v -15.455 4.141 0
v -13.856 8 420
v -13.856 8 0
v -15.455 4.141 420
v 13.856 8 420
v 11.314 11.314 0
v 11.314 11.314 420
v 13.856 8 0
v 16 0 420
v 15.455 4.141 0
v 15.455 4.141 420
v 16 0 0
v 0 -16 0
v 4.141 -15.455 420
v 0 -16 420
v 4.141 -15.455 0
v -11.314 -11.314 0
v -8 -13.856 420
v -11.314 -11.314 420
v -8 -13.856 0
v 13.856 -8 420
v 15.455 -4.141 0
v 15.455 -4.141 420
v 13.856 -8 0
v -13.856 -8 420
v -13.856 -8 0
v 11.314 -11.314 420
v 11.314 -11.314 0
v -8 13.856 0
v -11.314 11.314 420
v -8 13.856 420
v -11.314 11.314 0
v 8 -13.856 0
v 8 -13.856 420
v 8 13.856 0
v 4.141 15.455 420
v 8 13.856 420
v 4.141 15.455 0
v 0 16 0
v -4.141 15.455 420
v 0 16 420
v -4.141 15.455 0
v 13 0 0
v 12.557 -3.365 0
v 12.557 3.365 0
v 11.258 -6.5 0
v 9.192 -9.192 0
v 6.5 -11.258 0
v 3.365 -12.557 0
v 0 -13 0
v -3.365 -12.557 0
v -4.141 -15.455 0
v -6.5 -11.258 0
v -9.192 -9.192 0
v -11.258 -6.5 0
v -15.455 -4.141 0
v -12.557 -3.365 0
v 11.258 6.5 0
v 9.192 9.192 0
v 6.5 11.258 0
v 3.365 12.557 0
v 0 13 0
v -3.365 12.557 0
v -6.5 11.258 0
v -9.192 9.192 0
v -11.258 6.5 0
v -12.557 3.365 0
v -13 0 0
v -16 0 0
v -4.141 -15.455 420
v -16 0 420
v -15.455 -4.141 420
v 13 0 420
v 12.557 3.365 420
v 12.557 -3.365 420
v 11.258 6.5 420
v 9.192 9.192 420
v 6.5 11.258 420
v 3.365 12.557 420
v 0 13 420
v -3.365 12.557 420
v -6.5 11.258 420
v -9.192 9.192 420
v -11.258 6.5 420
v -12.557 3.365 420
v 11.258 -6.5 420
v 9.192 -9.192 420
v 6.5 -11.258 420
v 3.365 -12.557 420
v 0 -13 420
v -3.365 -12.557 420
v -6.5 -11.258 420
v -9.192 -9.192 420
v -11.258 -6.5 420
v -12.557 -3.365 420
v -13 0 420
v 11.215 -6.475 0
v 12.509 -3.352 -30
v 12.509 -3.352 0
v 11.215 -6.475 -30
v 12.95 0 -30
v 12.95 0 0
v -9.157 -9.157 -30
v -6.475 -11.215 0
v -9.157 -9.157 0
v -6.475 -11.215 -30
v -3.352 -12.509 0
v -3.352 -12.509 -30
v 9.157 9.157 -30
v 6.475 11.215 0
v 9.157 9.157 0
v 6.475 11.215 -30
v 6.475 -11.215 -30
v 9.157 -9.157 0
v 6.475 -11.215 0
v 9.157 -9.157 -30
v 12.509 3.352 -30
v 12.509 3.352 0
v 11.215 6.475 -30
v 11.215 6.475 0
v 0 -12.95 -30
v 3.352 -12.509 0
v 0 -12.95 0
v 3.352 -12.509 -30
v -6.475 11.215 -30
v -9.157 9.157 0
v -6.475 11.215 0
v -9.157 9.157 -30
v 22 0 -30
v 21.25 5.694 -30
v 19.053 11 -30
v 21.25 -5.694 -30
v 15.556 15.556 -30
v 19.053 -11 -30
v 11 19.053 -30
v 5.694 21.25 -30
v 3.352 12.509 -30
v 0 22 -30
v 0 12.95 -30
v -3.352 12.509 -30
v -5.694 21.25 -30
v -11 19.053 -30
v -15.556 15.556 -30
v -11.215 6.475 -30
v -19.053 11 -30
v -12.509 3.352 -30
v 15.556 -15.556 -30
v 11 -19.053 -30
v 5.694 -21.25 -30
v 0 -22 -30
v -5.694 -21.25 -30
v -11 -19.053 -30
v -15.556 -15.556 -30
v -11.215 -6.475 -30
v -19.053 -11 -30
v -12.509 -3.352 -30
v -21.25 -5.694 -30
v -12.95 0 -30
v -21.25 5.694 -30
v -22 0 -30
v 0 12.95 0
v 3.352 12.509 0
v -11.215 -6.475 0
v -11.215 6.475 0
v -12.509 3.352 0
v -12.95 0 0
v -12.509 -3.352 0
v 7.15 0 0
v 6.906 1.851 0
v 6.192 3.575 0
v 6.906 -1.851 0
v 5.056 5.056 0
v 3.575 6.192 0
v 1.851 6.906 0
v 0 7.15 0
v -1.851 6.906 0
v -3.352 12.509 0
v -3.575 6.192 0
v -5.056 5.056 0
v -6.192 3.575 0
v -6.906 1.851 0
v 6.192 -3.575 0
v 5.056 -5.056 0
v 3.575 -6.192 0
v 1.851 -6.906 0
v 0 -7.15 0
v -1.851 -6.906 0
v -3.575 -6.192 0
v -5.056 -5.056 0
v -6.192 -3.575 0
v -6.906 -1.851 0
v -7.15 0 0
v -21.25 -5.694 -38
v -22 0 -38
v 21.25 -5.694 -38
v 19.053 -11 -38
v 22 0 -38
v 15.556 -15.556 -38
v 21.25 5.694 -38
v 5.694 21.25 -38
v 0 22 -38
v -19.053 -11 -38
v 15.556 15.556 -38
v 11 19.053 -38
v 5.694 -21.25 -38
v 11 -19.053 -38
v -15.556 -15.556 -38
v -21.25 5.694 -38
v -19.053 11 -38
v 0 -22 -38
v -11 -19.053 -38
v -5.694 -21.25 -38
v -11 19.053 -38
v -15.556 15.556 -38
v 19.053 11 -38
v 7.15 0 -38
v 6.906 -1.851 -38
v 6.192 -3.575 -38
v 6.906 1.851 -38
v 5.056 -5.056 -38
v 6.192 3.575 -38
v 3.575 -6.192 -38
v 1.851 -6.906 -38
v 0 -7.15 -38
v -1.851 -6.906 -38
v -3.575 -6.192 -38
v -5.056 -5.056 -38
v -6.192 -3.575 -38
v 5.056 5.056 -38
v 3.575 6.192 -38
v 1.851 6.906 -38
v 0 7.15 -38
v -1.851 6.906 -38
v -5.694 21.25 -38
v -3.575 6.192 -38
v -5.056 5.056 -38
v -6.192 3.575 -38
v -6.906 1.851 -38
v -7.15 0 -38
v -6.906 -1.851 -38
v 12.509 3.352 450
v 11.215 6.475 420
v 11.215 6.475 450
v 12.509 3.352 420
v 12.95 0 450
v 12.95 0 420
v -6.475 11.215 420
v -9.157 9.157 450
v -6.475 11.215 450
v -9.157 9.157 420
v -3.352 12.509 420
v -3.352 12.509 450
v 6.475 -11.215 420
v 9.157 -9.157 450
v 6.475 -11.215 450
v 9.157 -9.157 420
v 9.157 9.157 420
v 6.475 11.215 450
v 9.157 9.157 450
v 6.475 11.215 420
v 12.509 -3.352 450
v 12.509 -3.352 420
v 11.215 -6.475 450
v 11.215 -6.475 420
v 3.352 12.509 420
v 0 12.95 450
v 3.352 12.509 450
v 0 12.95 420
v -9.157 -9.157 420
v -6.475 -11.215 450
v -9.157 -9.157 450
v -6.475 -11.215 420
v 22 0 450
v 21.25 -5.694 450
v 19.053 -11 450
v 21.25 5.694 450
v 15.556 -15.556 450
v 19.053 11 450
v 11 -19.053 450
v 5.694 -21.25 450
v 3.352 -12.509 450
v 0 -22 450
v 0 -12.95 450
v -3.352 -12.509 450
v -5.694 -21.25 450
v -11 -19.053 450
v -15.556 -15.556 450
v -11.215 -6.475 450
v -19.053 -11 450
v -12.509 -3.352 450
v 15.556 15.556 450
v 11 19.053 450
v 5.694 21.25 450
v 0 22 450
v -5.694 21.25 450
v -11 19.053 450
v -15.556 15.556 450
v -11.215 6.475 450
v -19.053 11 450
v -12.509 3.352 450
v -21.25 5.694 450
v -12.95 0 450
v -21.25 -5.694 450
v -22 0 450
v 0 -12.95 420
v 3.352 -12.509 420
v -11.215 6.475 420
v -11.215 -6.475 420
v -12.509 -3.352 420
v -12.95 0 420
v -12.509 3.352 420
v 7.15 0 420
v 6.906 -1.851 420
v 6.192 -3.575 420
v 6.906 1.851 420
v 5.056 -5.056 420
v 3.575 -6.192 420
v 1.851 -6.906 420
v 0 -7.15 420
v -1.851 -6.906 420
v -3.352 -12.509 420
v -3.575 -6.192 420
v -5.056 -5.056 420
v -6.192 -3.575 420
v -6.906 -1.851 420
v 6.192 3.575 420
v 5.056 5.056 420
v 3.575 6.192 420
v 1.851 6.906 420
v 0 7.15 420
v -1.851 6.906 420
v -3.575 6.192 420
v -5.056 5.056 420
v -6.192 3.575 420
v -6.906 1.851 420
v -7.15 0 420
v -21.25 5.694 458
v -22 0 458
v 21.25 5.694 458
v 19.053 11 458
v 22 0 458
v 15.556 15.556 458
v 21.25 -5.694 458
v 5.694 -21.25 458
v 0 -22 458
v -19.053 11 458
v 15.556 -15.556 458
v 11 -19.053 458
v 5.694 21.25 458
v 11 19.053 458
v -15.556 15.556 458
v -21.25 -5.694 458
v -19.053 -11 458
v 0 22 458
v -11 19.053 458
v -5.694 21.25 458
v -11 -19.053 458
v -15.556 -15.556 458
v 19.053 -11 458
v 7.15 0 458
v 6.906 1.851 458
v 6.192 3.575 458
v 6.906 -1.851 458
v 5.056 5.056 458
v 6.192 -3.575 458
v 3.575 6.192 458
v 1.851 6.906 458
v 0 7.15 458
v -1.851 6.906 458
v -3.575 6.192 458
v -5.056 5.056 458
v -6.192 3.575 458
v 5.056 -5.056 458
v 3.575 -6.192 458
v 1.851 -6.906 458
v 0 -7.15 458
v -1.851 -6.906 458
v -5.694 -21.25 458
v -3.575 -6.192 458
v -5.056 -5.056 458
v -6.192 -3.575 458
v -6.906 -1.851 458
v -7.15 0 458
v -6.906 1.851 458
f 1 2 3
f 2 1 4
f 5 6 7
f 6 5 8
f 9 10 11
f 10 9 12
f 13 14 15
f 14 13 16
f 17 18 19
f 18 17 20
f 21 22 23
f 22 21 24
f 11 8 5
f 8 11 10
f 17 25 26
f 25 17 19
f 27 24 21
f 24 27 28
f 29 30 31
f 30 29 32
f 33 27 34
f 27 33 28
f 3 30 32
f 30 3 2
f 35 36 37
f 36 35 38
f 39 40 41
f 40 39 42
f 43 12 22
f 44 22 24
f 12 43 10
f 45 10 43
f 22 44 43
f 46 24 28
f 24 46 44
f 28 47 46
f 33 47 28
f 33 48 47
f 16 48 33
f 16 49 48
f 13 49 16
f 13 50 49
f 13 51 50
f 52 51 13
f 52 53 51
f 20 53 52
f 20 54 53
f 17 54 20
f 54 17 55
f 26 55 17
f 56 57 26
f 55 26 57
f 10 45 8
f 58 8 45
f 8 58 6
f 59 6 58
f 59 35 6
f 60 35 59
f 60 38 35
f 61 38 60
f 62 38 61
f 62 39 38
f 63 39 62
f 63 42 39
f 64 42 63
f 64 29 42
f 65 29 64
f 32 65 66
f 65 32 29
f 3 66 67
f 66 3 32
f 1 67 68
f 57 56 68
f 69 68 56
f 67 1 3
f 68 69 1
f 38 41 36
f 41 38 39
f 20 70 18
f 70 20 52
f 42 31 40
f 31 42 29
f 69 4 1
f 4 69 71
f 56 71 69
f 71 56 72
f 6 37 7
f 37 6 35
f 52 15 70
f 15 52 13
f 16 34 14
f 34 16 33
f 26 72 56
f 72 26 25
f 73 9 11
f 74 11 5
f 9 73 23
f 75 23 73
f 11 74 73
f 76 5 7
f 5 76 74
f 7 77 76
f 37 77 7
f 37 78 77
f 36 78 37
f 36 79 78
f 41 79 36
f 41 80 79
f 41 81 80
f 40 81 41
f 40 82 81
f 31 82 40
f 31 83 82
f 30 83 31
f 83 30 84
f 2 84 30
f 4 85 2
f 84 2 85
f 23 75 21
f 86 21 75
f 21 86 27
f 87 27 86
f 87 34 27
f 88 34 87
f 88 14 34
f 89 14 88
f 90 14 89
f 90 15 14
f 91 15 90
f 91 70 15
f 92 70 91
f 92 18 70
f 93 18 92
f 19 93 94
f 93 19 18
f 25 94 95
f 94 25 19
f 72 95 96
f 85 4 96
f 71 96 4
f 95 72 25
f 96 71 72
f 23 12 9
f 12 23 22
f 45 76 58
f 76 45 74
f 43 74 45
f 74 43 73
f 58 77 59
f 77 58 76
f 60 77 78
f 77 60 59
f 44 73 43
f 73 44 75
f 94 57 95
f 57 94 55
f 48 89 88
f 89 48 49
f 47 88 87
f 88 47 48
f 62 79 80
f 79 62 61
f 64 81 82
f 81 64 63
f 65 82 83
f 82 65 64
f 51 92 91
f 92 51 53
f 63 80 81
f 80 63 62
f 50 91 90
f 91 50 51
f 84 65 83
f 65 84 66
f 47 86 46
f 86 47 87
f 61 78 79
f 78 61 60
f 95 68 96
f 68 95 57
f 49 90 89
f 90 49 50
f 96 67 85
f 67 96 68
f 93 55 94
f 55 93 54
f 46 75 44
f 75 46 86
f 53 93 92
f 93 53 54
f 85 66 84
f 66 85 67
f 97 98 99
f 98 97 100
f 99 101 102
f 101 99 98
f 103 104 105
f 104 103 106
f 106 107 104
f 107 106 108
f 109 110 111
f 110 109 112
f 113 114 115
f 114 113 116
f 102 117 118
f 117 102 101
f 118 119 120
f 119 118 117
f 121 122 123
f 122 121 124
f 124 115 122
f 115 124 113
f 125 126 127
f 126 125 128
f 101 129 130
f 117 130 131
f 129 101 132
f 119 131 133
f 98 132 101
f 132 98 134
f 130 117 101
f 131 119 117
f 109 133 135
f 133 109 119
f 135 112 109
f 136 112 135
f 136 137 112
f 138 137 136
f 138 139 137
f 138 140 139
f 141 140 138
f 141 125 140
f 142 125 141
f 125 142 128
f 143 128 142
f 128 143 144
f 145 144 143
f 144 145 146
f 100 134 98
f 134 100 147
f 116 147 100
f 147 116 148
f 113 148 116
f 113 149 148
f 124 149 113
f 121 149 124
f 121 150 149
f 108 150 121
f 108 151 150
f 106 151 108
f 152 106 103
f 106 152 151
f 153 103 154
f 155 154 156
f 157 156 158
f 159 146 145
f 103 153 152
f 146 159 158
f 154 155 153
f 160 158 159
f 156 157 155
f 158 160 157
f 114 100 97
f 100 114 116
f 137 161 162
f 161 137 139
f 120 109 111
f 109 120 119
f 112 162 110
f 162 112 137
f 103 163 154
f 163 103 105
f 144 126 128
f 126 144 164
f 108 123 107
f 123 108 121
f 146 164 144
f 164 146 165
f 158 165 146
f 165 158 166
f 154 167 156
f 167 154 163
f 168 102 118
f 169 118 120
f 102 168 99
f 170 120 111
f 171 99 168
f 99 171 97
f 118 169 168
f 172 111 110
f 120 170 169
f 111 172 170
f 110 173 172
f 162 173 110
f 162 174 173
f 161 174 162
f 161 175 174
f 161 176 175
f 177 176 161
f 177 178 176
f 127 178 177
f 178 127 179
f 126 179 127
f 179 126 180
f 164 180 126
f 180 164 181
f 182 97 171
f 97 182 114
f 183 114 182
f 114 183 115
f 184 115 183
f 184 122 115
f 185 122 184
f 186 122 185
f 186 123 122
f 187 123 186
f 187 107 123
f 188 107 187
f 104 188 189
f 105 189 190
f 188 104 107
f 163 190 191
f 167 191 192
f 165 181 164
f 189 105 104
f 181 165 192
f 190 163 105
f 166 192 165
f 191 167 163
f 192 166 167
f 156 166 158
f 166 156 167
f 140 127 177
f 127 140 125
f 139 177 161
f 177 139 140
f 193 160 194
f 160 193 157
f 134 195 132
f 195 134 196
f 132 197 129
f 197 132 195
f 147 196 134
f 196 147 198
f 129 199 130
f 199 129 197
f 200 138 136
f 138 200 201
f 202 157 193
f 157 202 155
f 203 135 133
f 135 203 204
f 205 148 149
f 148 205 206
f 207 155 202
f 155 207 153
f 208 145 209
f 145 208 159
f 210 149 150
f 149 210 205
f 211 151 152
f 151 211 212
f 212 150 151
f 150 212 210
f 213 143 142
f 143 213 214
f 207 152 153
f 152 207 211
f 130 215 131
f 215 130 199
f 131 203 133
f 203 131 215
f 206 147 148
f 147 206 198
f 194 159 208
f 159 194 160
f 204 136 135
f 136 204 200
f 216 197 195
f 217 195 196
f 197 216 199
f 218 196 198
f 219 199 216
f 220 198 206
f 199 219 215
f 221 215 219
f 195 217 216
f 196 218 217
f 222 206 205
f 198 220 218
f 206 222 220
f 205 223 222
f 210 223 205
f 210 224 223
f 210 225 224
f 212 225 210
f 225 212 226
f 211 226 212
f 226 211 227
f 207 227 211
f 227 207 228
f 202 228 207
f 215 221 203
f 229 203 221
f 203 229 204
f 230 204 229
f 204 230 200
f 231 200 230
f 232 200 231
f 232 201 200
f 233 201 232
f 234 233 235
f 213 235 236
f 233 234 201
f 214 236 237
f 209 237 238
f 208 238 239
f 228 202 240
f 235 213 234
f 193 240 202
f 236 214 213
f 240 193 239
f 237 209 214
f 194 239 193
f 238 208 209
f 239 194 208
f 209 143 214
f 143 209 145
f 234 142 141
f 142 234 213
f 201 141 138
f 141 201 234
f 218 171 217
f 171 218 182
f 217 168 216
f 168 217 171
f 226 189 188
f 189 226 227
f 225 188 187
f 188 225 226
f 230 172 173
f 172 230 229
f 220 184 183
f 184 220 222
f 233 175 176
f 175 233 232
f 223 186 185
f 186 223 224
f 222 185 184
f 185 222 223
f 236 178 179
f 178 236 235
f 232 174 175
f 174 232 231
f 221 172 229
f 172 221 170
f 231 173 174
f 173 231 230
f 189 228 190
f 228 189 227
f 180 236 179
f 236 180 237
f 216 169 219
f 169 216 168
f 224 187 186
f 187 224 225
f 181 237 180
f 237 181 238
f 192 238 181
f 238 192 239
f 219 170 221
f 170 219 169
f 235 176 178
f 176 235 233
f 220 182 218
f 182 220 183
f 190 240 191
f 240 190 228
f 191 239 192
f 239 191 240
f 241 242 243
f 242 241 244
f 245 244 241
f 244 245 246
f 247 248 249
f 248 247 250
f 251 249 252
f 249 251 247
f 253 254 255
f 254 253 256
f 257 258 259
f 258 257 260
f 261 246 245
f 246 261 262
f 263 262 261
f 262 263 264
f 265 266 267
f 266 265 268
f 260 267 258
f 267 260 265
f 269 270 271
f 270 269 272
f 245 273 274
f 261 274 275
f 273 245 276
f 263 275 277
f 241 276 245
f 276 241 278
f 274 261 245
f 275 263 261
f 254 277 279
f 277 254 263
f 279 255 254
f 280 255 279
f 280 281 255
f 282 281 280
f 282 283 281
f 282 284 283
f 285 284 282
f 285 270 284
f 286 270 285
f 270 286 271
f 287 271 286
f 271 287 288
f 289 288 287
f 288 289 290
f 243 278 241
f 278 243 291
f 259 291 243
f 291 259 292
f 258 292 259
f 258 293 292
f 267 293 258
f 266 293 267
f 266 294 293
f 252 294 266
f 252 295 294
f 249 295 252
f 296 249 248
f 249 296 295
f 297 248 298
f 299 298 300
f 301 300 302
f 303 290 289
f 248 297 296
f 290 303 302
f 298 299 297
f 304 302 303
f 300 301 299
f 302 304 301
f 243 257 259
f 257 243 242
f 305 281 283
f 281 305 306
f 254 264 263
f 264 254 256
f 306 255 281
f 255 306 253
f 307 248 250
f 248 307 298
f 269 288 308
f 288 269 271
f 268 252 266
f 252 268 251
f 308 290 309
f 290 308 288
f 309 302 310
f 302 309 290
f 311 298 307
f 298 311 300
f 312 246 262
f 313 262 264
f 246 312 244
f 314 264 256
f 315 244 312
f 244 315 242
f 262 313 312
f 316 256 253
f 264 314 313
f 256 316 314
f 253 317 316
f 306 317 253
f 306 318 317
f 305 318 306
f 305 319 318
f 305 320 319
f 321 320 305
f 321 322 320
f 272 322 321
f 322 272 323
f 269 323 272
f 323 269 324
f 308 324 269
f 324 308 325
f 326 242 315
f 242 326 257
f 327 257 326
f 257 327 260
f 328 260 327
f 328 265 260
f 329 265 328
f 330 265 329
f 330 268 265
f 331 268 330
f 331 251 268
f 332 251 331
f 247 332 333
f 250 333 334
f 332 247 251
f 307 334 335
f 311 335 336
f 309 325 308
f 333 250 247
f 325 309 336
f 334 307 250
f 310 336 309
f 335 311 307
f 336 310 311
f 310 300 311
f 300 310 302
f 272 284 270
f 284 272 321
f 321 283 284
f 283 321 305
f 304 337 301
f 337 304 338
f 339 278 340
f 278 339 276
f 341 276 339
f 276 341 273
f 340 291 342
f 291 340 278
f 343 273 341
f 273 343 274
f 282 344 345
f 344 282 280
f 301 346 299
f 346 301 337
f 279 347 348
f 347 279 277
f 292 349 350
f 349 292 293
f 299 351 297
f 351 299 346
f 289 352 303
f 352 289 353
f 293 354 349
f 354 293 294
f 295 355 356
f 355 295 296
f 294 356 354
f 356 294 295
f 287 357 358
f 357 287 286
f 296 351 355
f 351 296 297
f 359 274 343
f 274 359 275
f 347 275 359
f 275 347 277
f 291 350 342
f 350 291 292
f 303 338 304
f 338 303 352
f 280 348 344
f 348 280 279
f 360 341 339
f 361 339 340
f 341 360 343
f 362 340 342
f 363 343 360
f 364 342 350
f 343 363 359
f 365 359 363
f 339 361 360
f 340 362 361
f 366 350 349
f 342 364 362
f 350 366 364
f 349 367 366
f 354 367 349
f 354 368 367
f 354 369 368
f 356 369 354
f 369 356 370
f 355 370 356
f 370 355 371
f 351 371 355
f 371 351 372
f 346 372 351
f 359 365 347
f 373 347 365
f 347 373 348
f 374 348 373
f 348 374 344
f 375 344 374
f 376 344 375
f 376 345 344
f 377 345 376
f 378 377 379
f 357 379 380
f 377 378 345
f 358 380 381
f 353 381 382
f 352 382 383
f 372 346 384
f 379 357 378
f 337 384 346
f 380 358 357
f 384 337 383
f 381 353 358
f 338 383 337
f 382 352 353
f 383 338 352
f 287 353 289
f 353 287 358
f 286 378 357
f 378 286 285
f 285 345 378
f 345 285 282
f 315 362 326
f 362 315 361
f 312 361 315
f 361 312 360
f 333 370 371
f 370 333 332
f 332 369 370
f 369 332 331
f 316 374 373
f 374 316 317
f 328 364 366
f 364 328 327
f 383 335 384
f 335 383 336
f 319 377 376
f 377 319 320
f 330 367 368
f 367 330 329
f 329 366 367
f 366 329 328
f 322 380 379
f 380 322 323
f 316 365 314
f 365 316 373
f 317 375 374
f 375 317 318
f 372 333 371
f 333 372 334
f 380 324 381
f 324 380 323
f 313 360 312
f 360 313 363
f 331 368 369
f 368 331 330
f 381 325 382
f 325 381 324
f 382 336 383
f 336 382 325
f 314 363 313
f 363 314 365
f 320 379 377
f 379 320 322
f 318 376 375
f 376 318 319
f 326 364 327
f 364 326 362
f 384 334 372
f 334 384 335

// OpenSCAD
// tibia.scad
// Free Humanoid Platform — Leg v0.1 — tibia tube parametric
//
// Tibia structural tube (BOM tibia_tube) + two end-caps (BOM tibia_endcap).
// Knee-side end-cap mates to knee cycloidal output (cyclo_30 output flange).
// Ankle-side end-cap mates to ankle-pitch QDD planetary input frame.
//
// REFERENCE GEOMETRY — NOT VALIDATED BY PHYSICAL BUILD.

include <leg_params.scad>;

// --------------------------------------------------------------------------
// tibia_tube_only() — bare aluminum tube
// --------------------------------------------------------------------------
module tibia_tube_only(length = tibia_tube_length) {
    color("LightSteelBlue")
    difference() {
        cylinder(h = length, d = tibia_tube_od, center = false);
        translate([0, 0, -0.1])
            cylinder(h = length + 0.2, d = tibia_tube_id, center = false);
    }
}

// --------------------------------------------------------------------------
// tibia_endcap(side) — milled aluminum end-cap
//   side = "knee"  → mates cyclo_30 output flange
//   side = "ankle" → mates ankle-pitch QDD housing
// --------------------------------------------------------------------------
module tibia_endcap(side = "knee") {
    pcd       = (side == "knee") ? cyclo_30_output_pcd : qdd_motor_face_pcd;
    bolt_m    = (side == "knee") ? cyclo_30_output_bolt_m : qdd_motor_face_bolt_m;
    bolt_n    = (side == "knee") ? cyclo_30_output_bolt_n : qdd_motor_face_bolt_n;
    flange_od = tibia_tube_od + 12.0;

    color("Silver")
    difference() {
        union() {
            cylinder(h = end_cap_axial_length,
                     d = tibia_tube_id - end_cap_press_int * 2,
                     center = false);
            translate([0, 0, end_cap_axial_length])
                cylinder(h = 8.0, d = flange_od, center = false);
        }
        // Central harness bore
        translate([0, 0, -0.1])
            cylinder(h = end_cap_axial_length + 8.2,
                     d = tibia_tube_id * 0.55, center = false);
        // Bolt circle
        for (i = [0 : bolt_n - 1]) {
            angle = i * 360 / bolt_n;
            translate([cos(angle) * pcd / 2,
                       sin(angle) * pcd / 2,
                       end_cap_axial_length - 0.1])
                cylinder(h = 8.5,
                         d = (bolt_m == 5) ? m5_clear_dia
                            : (bolt_m == 4) ? m4_clear_dia
                            : m6_clear_dia,
                         center = false);
        }
    }
}

// --------------------------------------------------------------------------
// tibia() — complete tibia assembly
// --------------------------------------------------------------------------
module tibia() {
    tibia_tube_only();
    // Ankle-side end-cap (z=0, pointing down)
    rotate([180, 0, 0])
        tibia_endcap(side = "ankle");
    // Knee-side end-cap (z=length, pointing up)
    translate([0, 0, tibia_tube_length])
        tibia_endcap(side = "knee");
}

// --------------------------------------------------------------------------
// Demo render
// --------------------------------------------------------------------------
tibia();
